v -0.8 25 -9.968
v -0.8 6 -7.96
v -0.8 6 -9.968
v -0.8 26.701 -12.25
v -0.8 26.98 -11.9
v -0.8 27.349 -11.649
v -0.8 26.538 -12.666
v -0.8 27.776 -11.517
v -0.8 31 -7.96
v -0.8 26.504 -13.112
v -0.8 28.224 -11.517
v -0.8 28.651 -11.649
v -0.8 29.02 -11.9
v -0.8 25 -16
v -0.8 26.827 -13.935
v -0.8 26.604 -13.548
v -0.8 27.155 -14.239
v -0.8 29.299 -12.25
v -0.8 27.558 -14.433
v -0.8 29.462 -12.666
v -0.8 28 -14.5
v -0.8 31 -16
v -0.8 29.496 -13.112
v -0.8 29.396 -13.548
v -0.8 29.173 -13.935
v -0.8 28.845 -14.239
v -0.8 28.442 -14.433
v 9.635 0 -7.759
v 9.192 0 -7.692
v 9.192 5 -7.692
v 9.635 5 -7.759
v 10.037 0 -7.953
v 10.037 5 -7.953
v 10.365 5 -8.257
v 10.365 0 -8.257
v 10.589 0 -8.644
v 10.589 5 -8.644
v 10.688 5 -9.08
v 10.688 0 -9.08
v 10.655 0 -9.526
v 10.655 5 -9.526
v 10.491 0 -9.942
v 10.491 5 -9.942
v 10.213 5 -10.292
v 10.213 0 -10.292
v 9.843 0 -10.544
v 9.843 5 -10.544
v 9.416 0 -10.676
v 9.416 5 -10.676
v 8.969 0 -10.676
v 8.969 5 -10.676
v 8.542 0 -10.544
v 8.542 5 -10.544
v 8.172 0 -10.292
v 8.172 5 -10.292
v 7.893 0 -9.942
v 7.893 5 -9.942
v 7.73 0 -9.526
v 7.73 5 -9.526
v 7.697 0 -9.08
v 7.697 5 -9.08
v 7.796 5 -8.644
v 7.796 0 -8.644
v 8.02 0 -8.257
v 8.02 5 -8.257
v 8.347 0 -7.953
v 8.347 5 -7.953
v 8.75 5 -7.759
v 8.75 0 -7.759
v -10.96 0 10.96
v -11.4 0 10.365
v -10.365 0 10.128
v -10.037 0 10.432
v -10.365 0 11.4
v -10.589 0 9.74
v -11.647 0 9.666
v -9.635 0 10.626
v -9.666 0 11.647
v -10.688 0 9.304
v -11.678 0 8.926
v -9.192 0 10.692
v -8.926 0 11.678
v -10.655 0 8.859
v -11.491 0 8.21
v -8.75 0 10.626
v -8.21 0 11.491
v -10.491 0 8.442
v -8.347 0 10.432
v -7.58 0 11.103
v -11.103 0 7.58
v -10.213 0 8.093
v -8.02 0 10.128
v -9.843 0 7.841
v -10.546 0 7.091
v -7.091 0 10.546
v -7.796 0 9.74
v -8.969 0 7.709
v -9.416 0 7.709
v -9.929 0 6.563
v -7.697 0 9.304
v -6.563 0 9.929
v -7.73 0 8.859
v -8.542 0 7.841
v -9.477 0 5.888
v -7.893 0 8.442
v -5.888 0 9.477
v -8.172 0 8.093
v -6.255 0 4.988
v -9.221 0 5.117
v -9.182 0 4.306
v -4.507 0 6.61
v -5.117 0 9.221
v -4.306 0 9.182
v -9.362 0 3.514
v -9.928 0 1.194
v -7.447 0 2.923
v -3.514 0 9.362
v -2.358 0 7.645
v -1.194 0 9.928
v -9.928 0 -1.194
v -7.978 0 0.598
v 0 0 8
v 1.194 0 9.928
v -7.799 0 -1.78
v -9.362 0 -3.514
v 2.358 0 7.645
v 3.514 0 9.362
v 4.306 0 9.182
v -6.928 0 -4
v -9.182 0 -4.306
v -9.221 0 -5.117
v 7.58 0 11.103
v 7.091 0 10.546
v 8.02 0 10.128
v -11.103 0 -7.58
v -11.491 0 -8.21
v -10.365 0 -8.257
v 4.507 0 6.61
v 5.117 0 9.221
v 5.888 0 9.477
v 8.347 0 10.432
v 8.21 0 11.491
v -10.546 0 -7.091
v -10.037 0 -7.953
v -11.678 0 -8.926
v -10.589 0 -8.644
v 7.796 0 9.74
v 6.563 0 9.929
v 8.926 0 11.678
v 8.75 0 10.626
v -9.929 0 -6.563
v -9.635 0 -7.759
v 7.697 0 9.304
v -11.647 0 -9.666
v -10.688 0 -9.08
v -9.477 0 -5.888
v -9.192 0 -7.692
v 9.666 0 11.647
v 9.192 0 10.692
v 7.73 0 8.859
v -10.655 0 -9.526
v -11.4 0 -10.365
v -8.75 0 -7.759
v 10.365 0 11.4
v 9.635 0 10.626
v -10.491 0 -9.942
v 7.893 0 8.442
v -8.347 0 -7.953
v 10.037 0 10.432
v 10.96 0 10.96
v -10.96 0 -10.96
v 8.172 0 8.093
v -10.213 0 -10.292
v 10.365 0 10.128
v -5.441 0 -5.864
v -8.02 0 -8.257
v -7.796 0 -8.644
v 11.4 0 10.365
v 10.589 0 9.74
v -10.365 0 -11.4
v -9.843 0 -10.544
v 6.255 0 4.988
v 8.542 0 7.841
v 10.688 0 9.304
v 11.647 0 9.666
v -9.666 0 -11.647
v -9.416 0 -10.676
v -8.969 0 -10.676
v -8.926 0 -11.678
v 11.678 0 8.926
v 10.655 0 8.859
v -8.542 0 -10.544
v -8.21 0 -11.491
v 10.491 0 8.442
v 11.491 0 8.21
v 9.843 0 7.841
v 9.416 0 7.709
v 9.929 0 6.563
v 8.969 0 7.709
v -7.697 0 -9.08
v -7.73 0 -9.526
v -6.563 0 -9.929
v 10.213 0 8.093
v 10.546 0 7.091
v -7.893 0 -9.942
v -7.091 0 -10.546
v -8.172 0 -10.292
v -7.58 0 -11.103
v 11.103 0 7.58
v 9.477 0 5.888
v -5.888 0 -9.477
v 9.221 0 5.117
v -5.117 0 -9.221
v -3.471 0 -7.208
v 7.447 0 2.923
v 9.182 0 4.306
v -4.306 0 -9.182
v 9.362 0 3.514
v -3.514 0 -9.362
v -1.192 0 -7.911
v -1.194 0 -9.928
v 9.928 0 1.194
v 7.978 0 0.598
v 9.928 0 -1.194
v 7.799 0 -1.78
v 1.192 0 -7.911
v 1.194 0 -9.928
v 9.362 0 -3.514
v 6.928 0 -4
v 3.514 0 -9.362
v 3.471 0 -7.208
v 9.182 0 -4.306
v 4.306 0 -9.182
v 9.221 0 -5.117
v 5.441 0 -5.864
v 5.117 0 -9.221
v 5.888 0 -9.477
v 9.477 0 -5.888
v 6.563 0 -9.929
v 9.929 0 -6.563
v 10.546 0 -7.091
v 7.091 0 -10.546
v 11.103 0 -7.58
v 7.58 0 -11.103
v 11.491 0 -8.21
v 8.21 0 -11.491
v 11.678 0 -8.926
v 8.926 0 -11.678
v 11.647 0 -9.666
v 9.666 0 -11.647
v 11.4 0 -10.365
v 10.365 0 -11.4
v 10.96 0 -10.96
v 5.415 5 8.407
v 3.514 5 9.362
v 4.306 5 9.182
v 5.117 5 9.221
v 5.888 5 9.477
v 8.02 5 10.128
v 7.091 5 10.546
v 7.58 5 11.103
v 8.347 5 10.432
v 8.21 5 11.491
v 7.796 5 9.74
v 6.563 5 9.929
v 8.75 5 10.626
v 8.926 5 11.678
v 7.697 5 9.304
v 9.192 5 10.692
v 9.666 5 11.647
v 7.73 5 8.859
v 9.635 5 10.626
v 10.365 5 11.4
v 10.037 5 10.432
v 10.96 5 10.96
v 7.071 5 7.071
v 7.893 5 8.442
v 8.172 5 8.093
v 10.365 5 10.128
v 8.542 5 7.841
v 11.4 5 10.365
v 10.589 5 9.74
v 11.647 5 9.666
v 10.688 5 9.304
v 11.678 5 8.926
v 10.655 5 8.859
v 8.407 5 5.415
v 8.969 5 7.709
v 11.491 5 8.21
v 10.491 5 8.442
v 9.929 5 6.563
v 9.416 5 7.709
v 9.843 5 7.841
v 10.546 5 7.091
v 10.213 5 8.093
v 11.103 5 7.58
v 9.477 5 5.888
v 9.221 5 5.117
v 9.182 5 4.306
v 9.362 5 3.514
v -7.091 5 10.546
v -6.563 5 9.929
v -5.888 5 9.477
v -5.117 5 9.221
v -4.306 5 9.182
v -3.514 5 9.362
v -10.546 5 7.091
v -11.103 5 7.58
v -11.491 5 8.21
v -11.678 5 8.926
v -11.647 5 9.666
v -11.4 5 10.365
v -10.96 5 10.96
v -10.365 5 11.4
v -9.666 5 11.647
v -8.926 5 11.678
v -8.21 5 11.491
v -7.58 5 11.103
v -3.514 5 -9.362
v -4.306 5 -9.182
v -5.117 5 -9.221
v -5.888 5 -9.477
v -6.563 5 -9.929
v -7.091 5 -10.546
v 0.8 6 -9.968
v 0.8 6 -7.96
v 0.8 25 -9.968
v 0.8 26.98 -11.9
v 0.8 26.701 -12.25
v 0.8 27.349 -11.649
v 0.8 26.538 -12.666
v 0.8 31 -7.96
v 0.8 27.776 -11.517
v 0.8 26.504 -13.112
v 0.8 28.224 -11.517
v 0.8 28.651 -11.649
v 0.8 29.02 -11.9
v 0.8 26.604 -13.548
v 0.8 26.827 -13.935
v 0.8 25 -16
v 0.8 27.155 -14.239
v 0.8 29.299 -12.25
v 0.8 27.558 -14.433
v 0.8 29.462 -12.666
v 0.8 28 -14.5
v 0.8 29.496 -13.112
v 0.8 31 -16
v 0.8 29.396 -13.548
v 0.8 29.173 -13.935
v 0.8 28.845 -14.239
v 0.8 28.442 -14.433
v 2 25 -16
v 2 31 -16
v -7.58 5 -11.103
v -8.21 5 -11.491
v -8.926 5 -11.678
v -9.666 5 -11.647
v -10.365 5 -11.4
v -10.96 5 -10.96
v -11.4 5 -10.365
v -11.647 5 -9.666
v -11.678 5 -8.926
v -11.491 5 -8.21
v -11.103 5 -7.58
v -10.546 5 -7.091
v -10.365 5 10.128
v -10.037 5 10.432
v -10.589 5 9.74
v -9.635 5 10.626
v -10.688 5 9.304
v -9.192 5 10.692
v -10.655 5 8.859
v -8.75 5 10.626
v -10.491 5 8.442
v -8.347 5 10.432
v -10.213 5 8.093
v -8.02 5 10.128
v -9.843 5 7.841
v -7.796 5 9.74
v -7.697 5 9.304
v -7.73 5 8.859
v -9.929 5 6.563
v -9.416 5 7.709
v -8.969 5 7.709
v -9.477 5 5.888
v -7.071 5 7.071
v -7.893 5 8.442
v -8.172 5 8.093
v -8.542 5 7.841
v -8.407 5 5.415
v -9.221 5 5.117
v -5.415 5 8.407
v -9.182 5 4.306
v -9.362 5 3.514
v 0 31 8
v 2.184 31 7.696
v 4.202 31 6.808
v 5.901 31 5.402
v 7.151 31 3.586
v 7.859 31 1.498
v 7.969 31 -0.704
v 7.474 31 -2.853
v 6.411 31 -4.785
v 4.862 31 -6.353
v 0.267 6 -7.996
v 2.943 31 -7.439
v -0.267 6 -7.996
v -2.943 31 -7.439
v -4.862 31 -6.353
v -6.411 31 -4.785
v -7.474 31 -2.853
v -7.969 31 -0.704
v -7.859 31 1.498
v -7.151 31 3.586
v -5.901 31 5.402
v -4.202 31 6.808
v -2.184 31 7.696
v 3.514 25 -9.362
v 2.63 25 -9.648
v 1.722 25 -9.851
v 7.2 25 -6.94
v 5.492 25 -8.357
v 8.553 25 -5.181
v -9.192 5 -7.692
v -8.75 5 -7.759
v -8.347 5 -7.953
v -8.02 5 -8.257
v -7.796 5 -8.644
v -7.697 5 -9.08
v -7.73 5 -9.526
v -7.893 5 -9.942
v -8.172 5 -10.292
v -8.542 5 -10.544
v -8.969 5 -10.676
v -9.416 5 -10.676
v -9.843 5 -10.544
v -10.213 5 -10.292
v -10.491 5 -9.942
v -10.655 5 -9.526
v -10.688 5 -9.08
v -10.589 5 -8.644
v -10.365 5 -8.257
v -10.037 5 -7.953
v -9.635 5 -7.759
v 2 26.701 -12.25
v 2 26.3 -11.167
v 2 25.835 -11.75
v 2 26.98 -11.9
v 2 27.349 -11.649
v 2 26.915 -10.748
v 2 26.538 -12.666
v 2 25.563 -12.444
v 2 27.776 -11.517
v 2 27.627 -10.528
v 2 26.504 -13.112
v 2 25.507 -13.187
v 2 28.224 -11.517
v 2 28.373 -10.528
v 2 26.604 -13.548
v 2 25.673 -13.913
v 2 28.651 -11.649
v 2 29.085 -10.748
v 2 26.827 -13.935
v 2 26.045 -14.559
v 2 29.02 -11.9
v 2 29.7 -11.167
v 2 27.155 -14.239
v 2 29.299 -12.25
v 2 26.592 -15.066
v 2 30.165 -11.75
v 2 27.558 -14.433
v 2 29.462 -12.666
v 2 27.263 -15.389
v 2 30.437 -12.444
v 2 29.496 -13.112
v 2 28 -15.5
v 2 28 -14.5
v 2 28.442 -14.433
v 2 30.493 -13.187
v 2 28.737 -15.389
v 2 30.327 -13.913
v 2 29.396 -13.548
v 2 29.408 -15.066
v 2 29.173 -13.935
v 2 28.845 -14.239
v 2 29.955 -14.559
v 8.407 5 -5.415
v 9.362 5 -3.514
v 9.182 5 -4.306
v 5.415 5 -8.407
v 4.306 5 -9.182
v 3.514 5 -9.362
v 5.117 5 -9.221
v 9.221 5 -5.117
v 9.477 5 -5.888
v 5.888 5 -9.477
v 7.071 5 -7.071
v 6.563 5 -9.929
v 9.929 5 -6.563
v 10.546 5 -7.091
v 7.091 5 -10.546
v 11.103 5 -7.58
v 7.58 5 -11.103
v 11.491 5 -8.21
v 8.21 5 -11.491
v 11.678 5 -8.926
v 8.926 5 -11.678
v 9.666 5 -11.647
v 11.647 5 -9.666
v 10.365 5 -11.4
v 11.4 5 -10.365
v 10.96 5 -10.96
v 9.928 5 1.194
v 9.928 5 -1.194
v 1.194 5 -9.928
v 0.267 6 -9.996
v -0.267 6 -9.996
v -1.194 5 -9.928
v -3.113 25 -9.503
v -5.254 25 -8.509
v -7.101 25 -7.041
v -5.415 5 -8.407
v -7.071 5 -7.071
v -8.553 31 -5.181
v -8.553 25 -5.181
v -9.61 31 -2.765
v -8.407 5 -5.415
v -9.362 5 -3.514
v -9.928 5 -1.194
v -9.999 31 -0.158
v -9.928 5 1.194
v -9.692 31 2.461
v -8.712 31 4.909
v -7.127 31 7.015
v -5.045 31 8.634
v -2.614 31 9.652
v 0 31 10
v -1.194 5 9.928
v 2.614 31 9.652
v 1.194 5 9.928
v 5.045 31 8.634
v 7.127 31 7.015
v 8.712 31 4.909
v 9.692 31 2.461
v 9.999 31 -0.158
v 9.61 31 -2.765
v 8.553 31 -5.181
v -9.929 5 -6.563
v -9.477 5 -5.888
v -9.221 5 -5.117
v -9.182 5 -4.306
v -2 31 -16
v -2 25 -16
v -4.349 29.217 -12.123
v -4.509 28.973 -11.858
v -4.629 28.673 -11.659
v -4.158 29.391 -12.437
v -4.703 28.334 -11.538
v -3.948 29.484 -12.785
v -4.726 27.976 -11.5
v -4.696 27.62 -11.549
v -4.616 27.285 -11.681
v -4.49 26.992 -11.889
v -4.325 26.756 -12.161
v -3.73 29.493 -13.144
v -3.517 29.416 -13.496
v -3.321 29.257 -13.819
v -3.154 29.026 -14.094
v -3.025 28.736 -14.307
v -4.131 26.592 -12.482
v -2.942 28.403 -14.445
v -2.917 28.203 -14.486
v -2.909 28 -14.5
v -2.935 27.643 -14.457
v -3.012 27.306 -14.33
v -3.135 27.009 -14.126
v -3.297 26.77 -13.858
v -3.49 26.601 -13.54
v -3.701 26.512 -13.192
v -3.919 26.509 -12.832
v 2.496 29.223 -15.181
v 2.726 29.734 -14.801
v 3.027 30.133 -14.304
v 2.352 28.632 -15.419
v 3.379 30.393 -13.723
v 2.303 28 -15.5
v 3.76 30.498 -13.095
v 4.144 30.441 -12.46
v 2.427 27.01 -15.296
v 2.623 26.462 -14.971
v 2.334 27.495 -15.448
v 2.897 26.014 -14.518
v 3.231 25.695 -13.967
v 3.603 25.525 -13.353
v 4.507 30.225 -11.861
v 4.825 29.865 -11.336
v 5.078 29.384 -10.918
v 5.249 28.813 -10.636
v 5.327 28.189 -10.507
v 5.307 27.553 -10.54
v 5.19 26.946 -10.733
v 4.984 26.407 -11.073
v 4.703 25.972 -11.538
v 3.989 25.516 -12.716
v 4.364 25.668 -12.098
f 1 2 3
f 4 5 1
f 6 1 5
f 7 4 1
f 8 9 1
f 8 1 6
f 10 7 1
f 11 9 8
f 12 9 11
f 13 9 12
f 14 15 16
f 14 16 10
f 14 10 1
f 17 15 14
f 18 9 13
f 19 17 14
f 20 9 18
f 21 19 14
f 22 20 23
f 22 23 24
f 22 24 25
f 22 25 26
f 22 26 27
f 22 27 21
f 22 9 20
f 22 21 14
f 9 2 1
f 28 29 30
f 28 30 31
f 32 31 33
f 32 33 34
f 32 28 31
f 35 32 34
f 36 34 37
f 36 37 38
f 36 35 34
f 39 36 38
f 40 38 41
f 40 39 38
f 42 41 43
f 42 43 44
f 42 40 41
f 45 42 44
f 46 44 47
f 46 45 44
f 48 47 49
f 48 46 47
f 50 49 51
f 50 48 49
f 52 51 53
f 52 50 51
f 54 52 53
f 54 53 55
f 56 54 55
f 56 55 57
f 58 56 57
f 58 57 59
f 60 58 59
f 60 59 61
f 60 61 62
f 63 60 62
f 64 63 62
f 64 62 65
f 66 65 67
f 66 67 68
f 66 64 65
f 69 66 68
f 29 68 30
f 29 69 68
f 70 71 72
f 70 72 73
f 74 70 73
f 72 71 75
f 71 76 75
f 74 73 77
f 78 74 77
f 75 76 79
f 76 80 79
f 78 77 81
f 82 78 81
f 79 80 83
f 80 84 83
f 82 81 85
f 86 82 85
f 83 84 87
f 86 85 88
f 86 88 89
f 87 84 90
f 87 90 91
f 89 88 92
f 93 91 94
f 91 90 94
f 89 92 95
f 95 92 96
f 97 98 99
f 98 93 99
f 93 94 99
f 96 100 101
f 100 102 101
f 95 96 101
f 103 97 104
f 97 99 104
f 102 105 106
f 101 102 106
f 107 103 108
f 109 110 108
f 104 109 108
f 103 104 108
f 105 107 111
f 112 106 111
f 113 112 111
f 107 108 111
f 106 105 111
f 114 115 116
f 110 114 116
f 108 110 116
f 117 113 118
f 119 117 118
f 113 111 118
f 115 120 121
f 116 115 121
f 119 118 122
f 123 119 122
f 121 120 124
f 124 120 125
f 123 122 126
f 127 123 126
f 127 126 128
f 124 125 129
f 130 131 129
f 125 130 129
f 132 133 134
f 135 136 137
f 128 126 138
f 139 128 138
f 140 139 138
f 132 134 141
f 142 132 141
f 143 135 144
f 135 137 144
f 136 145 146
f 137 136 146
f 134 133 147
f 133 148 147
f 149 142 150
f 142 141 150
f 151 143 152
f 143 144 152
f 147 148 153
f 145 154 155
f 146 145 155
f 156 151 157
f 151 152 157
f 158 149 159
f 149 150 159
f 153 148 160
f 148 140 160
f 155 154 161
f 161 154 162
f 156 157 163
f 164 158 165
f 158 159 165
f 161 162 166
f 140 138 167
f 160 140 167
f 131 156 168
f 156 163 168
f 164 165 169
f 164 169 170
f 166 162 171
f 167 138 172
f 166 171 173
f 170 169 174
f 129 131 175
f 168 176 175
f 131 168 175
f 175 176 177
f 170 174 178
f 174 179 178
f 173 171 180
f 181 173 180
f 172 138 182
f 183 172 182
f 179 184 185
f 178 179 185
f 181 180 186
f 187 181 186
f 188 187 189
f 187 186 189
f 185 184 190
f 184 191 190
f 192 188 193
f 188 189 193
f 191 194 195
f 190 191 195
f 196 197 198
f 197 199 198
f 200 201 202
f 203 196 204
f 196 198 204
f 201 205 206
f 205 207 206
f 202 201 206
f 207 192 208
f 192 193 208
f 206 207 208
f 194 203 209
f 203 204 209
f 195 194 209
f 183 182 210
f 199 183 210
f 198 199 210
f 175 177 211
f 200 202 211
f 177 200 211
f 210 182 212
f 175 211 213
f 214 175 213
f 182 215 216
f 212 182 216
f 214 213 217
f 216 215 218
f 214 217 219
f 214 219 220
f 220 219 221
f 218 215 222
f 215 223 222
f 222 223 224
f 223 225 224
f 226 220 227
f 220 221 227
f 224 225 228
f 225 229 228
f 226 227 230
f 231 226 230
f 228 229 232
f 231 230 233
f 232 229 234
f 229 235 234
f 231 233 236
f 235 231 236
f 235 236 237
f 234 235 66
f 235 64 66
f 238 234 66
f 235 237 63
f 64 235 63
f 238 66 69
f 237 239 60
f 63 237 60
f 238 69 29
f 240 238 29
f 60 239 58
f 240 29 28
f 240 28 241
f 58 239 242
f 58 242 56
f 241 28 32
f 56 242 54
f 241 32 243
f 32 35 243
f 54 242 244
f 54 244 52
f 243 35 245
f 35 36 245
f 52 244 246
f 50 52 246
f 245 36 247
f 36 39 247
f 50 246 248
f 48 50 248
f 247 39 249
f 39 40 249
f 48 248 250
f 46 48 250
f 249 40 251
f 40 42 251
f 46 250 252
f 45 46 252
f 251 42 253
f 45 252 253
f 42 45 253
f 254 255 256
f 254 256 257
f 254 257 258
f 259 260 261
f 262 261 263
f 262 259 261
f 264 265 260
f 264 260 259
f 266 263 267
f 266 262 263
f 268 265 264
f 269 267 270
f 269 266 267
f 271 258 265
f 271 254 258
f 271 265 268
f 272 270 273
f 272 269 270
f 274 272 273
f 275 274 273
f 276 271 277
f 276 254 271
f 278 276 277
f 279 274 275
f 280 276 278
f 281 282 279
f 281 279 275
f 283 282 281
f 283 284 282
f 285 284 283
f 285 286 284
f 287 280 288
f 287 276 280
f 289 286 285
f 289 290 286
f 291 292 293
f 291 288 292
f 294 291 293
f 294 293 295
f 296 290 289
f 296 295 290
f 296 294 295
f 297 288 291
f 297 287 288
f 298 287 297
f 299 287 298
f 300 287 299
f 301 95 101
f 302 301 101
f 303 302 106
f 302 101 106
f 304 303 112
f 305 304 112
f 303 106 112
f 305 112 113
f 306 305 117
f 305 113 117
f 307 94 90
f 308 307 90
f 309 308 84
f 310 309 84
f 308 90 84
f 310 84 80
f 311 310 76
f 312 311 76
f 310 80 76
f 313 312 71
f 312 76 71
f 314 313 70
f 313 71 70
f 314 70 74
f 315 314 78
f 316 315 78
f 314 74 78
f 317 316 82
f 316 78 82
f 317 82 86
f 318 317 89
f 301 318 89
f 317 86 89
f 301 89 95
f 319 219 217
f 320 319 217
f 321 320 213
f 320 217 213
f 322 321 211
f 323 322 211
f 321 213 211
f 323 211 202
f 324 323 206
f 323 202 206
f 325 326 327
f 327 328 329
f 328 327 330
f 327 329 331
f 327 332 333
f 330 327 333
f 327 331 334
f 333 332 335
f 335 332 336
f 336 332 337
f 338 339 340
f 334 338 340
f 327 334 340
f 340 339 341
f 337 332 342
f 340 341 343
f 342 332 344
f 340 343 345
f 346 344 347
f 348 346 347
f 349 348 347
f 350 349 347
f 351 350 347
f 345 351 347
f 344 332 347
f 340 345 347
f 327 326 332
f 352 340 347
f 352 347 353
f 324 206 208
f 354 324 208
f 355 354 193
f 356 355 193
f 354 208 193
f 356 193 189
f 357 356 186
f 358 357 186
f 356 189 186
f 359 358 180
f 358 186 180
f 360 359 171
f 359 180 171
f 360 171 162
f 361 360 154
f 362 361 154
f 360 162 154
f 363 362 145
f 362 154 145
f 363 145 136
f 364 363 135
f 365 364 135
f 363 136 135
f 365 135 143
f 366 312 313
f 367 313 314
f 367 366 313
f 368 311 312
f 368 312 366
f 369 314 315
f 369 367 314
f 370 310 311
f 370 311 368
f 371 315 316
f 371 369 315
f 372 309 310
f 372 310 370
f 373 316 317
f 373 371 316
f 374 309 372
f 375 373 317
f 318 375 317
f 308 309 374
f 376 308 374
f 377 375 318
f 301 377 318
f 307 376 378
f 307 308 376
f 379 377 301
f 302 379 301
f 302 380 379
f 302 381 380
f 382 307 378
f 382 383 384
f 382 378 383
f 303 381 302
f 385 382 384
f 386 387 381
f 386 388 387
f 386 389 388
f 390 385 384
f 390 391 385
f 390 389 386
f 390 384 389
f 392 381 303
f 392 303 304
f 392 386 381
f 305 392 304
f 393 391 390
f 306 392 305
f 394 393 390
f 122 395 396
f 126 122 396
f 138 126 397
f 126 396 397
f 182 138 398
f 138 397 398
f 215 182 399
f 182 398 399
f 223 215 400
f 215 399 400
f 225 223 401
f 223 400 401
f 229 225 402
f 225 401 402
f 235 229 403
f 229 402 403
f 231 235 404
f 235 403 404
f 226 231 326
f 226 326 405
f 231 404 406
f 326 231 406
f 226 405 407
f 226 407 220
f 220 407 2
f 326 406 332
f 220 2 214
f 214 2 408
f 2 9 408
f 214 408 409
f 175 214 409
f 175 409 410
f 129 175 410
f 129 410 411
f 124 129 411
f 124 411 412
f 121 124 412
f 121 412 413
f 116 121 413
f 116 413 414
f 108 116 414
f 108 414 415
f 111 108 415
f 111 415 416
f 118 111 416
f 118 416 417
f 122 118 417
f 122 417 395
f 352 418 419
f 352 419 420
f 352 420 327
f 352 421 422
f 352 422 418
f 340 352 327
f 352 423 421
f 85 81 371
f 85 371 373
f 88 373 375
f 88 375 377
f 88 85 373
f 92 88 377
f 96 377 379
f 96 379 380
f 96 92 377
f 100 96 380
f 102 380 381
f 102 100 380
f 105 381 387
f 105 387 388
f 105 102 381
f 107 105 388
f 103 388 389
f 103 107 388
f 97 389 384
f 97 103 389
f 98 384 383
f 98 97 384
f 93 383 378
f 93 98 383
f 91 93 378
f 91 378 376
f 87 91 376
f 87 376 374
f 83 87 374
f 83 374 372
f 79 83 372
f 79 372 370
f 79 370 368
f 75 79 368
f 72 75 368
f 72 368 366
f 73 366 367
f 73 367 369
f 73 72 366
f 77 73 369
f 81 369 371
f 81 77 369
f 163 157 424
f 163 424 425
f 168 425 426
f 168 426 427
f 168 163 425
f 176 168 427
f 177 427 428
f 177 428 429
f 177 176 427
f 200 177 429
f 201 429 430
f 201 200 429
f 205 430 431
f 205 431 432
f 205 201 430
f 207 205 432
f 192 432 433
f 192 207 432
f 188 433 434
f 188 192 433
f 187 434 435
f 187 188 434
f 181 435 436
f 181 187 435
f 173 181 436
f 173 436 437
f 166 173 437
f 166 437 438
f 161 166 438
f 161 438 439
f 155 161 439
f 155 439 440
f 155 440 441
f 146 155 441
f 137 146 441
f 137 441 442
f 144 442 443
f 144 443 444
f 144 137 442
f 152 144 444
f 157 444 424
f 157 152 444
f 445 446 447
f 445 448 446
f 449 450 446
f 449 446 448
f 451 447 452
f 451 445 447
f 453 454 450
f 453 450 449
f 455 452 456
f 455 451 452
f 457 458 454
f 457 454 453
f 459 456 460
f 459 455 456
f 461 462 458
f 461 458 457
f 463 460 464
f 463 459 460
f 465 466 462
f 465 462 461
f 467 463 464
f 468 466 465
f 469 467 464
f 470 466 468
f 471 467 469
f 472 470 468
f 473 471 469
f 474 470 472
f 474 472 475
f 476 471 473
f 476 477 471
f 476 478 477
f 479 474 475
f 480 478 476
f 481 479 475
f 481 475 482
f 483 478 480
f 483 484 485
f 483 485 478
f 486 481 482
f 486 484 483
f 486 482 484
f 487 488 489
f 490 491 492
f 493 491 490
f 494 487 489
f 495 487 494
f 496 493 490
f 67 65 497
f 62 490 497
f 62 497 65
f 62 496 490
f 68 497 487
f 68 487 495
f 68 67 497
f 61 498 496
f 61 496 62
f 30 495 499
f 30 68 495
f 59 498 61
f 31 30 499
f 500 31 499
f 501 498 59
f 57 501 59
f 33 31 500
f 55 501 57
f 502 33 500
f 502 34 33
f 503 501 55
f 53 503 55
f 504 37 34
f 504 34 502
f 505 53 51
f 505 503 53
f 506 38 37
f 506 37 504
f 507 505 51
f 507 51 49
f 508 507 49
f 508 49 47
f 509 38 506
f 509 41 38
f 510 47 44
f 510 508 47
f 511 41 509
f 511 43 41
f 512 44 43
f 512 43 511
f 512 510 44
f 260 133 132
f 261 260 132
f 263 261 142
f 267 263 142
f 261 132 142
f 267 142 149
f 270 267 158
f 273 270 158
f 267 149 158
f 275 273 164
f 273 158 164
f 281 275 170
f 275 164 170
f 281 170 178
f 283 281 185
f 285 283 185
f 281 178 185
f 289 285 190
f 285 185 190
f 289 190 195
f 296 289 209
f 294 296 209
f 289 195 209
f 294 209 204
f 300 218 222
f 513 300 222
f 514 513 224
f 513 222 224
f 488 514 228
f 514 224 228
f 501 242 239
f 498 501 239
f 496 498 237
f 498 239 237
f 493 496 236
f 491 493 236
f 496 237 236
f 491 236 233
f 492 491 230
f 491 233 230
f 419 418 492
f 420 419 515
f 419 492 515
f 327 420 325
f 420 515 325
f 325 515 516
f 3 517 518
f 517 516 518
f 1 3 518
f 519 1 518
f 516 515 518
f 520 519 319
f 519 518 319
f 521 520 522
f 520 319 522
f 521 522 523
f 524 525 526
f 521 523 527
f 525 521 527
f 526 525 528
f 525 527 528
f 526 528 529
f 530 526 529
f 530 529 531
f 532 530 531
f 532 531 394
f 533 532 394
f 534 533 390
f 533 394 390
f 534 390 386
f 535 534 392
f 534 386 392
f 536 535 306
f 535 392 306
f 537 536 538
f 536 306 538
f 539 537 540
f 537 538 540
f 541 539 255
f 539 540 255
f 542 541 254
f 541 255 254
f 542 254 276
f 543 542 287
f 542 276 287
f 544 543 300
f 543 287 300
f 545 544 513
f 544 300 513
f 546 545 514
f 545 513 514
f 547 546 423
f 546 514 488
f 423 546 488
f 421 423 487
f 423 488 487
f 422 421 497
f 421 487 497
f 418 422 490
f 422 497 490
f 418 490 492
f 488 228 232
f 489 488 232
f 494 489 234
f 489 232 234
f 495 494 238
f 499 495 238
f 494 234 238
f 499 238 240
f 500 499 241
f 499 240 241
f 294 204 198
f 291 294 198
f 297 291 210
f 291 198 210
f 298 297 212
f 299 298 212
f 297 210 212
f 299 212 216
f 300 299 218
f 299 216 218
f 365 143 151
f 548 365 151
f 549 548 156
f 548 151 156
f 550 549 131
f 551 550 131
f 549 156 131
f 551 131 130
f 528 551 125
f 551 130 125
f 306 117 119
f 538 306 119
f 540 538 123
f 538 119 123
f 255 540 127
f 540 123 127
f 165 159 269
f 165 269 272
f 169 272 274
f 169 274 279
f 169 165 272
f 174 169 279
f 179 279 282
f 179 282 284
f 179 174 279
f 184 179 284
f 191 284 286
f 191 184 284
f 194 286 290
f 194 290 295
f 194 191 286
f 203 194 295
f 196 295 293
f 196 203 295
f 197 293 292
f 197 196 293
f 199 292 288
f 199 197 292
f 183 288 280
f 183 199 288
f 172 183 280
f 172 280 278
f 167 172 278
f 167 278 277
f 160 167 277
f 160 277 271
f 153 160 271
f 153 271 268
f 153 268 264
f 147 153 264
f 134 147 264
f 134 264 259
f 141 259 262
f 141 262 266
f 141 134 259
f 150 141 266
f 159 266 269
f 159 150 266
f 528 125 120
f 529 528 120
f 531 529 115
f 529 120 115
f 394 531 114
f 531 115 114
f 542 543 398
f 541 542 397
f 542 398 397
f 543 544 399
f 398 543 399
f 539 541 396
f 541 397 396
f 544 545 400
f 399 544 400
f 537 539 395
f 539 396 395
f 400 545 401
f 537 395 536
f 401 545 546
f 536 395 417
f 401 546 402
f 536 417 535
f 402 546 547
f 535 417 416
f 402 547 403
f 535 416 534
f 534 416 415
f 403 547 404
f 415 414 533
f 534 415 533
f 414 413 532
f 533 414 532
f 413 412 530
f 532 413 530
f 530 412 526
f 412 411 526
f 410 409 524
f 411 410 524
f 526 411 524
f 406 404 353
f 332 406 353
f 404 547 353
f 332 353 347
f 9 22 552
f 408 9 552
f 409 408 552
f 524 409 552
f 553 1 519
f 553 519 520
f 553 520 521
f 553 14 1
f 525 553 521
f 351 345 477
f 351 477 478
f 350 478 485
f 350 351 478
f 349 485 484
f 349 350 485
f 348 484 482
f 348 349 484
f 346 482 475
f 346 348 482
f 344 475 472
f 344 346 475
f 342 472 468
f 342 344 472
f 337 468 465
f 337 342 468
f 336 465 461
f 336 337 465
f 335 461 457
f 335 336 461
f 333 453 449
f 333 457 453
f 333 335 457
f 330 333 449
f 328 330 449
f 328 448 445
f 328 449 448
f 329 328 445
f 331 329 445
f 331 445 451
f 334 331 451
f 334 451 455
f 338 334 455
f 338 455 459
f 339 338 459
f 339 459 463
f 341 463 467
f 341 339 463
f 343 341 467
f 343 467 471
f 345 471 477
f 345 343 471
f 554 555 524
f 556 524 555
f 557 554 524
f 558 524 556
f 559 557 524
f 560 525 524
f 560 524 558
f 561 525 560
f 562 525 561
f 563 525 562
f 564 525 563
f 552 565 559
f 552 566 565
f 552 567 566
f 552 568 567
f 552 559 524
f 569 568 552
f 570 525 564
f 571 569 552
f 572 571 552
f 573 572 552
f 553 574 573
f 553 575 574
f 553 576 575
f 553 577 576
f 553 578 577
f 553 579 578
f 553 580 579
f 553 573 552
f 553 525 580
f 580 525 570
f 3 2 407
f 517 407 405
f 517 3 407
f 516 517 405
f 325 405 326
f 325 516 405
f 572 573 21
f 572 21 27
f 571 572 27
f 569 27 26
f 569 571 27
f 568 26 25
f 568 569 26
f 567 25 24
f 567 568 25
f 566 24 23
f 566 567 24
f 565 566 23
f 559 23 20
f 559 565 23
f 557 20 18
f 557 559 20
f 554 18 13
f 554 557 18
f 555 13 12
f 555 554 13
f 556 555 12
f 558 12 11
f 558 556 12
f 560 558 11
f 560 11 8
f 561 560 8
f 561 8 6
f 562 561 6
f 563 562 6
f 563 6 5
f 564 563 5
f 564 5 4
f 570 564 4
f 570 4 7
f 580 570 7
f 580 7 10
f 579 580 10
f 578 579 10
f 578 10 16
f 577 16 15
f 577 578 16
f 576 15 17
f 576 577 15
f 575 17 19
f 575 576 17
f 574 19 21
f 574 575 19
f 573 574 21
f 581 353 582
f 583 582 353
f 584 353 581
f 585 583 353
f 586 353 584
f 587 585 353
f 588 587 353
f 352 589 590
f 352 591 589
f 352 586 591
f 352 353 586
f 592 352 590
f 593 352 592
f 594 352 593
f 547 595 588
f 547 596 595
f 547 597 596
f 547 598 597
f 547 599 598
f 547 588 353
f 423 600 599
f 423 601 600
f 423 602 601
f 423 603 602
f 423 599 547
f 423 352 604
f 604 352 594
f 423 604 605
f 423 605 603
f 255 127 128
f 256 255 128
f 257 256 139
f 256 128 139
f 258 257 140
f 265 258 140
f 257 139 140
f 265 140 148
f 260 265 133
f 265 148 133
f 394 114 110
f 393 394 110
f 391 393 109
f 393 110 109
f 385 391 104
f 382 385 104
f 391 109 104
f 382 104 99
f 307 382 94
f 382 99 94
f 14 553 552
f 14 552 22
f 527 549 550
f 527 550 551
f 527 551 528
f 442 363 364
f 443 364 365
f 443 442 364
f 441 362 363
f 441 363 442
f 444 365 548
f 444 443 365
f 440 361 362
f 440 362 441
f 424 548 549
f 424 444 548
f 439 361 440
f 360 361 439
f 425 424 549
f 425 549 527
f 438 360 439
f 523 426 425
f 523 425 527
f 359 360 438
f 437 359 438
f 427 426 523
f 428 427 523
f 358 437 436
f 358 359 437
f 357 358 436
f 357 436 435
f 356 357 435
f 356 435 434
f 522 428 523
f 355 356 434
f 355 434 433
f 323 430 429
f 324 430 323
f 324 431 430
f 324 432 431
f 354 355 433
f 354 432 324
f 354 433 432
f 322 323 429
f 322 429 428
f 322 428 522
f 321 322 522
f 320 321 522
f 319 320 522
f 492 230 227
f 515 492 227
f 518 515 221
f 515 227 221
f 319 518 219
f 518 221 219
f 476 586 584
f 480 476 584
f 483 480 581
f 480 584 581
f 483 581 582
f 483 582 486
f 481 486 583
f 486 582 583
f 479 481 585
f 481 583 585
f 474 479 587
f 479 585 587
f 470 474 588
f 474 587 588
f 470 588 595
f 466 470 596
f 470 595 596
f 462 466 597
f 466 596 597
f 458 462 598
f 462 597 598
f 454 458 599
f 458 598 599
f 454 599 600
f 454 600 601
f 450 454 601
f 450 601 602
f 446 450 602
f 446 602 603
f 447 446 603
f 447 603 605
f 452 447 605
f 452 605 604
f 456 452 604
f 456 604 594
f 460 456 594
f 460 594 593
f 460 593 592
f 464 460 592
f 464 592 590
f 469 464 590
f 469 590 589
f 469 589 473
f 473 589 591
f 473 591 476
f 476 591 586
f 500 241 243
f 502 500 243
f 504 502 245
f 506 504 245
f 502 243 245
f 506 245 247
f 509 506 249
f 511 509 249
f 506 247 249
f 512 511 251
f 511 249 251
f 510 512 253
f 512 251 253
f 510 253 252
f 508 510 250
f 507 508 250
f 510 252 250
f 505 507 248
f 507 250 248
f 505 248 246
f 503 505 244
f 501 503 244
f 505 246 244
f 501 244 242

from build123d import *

# Parameters (mm, degrees)
SKETCH_1_R               = 1.5
EXTRUDE_1_DEPTH          = 5
SKETCH_2_R               = 10
EXTRUDE_2_DEPTH          = 26
SKETCH_3_R               = 8
CUT_EXTRUDE_1_DEPTH      = 36.134368951
EXTRUDE_START            = -6
EXTRUDE_3_DEPTH          = 6
SKETCH_5_W               = 1.6
SKETCH_5_H               = 16
CUT_EXTRUDE_2_DEPTH      = 25
CUT_EXTRUDE_3_DEPTH      = 37.792824583
CUT_EXTRUDE_3_DEPTH_BACK = 37.792824583
SKETCH_6_R               = 1.5
SKETCH_7_R               = 2.5
CUT_EXTRUDE_4_DEPTH      = 8


with BuildPart() as part:
    # 草图1 → 凸台-拉伸1 (new body)
    with BuildSketch(Plane(origin=(0, 0, 0), x_dir=(1, 0, 0), z_dir=(0, 1, 0))):
        with BuildLine():
            ThreePointArc((7.090675644, 10.546199264), (5.511531927, 9.322805199), (3.514323561, 9.362132765))
            ThreePointArc((3.514323561, 9.362132765), (0, 10), (-3.514323561, 9.362132765))
            ThreePointArc((-3.514323561, 9.362132765), (-5.511531927, 9.322805199), (-7.090675644, 10.546199264))
            ThreePointArc((-7.090675644, 10.546199264), (-10.960155108, 10.960155108), (-10.546199264, 7.090675644))
            ThreePointArc((-10.546199264, 7.090675644), (-9.322805199, 5.511531927), (-9.362132765, 3.514323561))
            ThreePointArc((-9.362132765, 3.514323561), (-10, 0), (-9.362132765, -3.514323561))
            ThreePointArc((-9.362132765, -3.514323561), (-9.322805199, -5.511531927), (-10.546199264, -7.090675644))
            ThreePointArc((-10.546199264, -7.090675644), (-10.960155108, -10.960155108), (-7.090675644, -10.546199264))
            ThreePointArc((-7.090675644, -10.546199264), (-5.511531927, -9.322805199), (-3.514323561, -9.362132765))
            ThreePointArc((-3.514323561, -9.362132765), (0, -10), (3.514323561, -9.362132765))
            ThreePointArc((3.514323561, -9.362132765), (5.511531927, -9.322805199), (7.090675644, -10.546199264))
            ThreePointArc((7.090675644, -10.546199264), (10.960155108, -10.960155108), (10.546199264, -7.090675644))
            ThreePointArc((10.546199264, -7.090675644), (9.322805199, -5.511531927), (9.362132765, -3.514323561))
            ThreePointArc((9.362132765, -3.514323561), (10, 0), (9.362132765, 3.514323561))
            ThreePointArc((9.362132765, 3.514323561), (9.322805199, 5.511531927), (10.546199264, 7.090675644))
            ThreePointArc((10.546199264, 7.090675644), (10.960155108, 10.960155108), (7.090675644, 10.546199264))
        make_face()
        with Locations(Location((-9.192388155, -9.192388155, 0), (0, 0, 270))):
            Circle(SKETCH_1_R, mode=Mode.SUBTRACT)
        with Locations(Location((9.192388155, -9.192388155, 0), (0, 0, 270))):
            Circle(SKETCH_1_R, mode=Mode.SUBTRACT)
        with Locations(Location((-9.192388155, 9.192388155, 0), (0, 0, 270))):
            Circle(SKETCH_1_R, mode=Mode.SUBTRACT)
        with Locations(Location((9.192388155, 9.192388155, 0), (0, 0, 270))):
            Circle(SKETCH_1_R, mode=Mode.SUBTRACT)
    extrude(amount=EXTRUDE_1_DEPTH)

    # 草图2 → 凸台-拉伸2 (add)
    with BuildSketch(Plane(origin=(0, 5, 0), x_dir=(1, 0, 0), z_dir=(0, 1, 0))):
        with Locations(Location((0, 0, 0), (0, 0, 69.425050538))):
            Circle(SKETCH_2_R)
    extrude(amount=EXTRUDE_2_DEPTH)

    # 草图3 → 切除-拉伸1 (cut, through all)
    with BuildSketch(Plane(origin=(0, 31, 0), x_dir=(1, 0, 0), z_dir=(0, 1, 0))):
        with Locations(Location((0, 0, 0), (0, 0, 270))):
            Circle(SKETCH_3_R)
    extrude(amount=-CUT_EXTRUDE_1_DEPTH, mode=Mode.SUBTRACT)

    # 草图4 → 凸台-拉伸3 (add)
    with BuildSketch(Plane(origin=(0, 31, 0), x_dir=(1, 0, 0), z_dir=(0, 1, 0)).offset(EXTRUDE_START)):
        with BuildLine():
            Line((-8.553298856, 5.180837643), (-2, 16))
            Line((-2, 16), (2, 16))
            Line((2, 16), (8.553298856, 5.180837643))
            ThreePointArc((8.553298856, 5.180837643), (0, 10), (-8.553298856, 5.180837643))
        make_face()
    extrude(amount=EXTRUDE_3_DEPTH)

    # 草图5 → 切除-拉伸2 (cut)
    with BuildSketch(Plane(origin=(0, 31, 0), x_dir=(1, 0, 0), z_dir=(0, 1, 0))):
        with Locations((0, 8)):
            Rectangle(SKETCH_5_W, SKETCH_5_H)
    extrude(amount=-CUT_EXTRUDE_2_DEPTH, mode=Mode.SUBTRACT)

    # 草图6 → 切除-拉伸3 (cut, two sides: drawn at the far end of the back side and taken through both)
    with BuildSketch(Plane(origin=(0, 0, 0), x_dir=(0, 0, -1), z_dir=(1, 0, 0)).offset(-CUT_EXTRUDE_3_DEPTH_BACK)):
        with Locations((13, 28)):
            Circle(SKETCH_6_R)
    extrude(amount=CUT_EXTRUDE_3_DEPTH + CUT_EXTRUDE_3_DEPTH_BACK, mode=Mode.SUBTRACT)

    # 草图7 → 切除-拉伸4 (cut)
    with BuildSketch(Plane(origin=(10, 0, 0), x_dir=(0, 0, -1), z_dir=(1, 0, 0))):
        with Locations((13, 28)):
            Circle(SKETCH_7_R)
    extrude(amount=-CUT_EXTRUDE_4_DEPTH, mode=Mode.SUBTRACT)


solid = part.part
